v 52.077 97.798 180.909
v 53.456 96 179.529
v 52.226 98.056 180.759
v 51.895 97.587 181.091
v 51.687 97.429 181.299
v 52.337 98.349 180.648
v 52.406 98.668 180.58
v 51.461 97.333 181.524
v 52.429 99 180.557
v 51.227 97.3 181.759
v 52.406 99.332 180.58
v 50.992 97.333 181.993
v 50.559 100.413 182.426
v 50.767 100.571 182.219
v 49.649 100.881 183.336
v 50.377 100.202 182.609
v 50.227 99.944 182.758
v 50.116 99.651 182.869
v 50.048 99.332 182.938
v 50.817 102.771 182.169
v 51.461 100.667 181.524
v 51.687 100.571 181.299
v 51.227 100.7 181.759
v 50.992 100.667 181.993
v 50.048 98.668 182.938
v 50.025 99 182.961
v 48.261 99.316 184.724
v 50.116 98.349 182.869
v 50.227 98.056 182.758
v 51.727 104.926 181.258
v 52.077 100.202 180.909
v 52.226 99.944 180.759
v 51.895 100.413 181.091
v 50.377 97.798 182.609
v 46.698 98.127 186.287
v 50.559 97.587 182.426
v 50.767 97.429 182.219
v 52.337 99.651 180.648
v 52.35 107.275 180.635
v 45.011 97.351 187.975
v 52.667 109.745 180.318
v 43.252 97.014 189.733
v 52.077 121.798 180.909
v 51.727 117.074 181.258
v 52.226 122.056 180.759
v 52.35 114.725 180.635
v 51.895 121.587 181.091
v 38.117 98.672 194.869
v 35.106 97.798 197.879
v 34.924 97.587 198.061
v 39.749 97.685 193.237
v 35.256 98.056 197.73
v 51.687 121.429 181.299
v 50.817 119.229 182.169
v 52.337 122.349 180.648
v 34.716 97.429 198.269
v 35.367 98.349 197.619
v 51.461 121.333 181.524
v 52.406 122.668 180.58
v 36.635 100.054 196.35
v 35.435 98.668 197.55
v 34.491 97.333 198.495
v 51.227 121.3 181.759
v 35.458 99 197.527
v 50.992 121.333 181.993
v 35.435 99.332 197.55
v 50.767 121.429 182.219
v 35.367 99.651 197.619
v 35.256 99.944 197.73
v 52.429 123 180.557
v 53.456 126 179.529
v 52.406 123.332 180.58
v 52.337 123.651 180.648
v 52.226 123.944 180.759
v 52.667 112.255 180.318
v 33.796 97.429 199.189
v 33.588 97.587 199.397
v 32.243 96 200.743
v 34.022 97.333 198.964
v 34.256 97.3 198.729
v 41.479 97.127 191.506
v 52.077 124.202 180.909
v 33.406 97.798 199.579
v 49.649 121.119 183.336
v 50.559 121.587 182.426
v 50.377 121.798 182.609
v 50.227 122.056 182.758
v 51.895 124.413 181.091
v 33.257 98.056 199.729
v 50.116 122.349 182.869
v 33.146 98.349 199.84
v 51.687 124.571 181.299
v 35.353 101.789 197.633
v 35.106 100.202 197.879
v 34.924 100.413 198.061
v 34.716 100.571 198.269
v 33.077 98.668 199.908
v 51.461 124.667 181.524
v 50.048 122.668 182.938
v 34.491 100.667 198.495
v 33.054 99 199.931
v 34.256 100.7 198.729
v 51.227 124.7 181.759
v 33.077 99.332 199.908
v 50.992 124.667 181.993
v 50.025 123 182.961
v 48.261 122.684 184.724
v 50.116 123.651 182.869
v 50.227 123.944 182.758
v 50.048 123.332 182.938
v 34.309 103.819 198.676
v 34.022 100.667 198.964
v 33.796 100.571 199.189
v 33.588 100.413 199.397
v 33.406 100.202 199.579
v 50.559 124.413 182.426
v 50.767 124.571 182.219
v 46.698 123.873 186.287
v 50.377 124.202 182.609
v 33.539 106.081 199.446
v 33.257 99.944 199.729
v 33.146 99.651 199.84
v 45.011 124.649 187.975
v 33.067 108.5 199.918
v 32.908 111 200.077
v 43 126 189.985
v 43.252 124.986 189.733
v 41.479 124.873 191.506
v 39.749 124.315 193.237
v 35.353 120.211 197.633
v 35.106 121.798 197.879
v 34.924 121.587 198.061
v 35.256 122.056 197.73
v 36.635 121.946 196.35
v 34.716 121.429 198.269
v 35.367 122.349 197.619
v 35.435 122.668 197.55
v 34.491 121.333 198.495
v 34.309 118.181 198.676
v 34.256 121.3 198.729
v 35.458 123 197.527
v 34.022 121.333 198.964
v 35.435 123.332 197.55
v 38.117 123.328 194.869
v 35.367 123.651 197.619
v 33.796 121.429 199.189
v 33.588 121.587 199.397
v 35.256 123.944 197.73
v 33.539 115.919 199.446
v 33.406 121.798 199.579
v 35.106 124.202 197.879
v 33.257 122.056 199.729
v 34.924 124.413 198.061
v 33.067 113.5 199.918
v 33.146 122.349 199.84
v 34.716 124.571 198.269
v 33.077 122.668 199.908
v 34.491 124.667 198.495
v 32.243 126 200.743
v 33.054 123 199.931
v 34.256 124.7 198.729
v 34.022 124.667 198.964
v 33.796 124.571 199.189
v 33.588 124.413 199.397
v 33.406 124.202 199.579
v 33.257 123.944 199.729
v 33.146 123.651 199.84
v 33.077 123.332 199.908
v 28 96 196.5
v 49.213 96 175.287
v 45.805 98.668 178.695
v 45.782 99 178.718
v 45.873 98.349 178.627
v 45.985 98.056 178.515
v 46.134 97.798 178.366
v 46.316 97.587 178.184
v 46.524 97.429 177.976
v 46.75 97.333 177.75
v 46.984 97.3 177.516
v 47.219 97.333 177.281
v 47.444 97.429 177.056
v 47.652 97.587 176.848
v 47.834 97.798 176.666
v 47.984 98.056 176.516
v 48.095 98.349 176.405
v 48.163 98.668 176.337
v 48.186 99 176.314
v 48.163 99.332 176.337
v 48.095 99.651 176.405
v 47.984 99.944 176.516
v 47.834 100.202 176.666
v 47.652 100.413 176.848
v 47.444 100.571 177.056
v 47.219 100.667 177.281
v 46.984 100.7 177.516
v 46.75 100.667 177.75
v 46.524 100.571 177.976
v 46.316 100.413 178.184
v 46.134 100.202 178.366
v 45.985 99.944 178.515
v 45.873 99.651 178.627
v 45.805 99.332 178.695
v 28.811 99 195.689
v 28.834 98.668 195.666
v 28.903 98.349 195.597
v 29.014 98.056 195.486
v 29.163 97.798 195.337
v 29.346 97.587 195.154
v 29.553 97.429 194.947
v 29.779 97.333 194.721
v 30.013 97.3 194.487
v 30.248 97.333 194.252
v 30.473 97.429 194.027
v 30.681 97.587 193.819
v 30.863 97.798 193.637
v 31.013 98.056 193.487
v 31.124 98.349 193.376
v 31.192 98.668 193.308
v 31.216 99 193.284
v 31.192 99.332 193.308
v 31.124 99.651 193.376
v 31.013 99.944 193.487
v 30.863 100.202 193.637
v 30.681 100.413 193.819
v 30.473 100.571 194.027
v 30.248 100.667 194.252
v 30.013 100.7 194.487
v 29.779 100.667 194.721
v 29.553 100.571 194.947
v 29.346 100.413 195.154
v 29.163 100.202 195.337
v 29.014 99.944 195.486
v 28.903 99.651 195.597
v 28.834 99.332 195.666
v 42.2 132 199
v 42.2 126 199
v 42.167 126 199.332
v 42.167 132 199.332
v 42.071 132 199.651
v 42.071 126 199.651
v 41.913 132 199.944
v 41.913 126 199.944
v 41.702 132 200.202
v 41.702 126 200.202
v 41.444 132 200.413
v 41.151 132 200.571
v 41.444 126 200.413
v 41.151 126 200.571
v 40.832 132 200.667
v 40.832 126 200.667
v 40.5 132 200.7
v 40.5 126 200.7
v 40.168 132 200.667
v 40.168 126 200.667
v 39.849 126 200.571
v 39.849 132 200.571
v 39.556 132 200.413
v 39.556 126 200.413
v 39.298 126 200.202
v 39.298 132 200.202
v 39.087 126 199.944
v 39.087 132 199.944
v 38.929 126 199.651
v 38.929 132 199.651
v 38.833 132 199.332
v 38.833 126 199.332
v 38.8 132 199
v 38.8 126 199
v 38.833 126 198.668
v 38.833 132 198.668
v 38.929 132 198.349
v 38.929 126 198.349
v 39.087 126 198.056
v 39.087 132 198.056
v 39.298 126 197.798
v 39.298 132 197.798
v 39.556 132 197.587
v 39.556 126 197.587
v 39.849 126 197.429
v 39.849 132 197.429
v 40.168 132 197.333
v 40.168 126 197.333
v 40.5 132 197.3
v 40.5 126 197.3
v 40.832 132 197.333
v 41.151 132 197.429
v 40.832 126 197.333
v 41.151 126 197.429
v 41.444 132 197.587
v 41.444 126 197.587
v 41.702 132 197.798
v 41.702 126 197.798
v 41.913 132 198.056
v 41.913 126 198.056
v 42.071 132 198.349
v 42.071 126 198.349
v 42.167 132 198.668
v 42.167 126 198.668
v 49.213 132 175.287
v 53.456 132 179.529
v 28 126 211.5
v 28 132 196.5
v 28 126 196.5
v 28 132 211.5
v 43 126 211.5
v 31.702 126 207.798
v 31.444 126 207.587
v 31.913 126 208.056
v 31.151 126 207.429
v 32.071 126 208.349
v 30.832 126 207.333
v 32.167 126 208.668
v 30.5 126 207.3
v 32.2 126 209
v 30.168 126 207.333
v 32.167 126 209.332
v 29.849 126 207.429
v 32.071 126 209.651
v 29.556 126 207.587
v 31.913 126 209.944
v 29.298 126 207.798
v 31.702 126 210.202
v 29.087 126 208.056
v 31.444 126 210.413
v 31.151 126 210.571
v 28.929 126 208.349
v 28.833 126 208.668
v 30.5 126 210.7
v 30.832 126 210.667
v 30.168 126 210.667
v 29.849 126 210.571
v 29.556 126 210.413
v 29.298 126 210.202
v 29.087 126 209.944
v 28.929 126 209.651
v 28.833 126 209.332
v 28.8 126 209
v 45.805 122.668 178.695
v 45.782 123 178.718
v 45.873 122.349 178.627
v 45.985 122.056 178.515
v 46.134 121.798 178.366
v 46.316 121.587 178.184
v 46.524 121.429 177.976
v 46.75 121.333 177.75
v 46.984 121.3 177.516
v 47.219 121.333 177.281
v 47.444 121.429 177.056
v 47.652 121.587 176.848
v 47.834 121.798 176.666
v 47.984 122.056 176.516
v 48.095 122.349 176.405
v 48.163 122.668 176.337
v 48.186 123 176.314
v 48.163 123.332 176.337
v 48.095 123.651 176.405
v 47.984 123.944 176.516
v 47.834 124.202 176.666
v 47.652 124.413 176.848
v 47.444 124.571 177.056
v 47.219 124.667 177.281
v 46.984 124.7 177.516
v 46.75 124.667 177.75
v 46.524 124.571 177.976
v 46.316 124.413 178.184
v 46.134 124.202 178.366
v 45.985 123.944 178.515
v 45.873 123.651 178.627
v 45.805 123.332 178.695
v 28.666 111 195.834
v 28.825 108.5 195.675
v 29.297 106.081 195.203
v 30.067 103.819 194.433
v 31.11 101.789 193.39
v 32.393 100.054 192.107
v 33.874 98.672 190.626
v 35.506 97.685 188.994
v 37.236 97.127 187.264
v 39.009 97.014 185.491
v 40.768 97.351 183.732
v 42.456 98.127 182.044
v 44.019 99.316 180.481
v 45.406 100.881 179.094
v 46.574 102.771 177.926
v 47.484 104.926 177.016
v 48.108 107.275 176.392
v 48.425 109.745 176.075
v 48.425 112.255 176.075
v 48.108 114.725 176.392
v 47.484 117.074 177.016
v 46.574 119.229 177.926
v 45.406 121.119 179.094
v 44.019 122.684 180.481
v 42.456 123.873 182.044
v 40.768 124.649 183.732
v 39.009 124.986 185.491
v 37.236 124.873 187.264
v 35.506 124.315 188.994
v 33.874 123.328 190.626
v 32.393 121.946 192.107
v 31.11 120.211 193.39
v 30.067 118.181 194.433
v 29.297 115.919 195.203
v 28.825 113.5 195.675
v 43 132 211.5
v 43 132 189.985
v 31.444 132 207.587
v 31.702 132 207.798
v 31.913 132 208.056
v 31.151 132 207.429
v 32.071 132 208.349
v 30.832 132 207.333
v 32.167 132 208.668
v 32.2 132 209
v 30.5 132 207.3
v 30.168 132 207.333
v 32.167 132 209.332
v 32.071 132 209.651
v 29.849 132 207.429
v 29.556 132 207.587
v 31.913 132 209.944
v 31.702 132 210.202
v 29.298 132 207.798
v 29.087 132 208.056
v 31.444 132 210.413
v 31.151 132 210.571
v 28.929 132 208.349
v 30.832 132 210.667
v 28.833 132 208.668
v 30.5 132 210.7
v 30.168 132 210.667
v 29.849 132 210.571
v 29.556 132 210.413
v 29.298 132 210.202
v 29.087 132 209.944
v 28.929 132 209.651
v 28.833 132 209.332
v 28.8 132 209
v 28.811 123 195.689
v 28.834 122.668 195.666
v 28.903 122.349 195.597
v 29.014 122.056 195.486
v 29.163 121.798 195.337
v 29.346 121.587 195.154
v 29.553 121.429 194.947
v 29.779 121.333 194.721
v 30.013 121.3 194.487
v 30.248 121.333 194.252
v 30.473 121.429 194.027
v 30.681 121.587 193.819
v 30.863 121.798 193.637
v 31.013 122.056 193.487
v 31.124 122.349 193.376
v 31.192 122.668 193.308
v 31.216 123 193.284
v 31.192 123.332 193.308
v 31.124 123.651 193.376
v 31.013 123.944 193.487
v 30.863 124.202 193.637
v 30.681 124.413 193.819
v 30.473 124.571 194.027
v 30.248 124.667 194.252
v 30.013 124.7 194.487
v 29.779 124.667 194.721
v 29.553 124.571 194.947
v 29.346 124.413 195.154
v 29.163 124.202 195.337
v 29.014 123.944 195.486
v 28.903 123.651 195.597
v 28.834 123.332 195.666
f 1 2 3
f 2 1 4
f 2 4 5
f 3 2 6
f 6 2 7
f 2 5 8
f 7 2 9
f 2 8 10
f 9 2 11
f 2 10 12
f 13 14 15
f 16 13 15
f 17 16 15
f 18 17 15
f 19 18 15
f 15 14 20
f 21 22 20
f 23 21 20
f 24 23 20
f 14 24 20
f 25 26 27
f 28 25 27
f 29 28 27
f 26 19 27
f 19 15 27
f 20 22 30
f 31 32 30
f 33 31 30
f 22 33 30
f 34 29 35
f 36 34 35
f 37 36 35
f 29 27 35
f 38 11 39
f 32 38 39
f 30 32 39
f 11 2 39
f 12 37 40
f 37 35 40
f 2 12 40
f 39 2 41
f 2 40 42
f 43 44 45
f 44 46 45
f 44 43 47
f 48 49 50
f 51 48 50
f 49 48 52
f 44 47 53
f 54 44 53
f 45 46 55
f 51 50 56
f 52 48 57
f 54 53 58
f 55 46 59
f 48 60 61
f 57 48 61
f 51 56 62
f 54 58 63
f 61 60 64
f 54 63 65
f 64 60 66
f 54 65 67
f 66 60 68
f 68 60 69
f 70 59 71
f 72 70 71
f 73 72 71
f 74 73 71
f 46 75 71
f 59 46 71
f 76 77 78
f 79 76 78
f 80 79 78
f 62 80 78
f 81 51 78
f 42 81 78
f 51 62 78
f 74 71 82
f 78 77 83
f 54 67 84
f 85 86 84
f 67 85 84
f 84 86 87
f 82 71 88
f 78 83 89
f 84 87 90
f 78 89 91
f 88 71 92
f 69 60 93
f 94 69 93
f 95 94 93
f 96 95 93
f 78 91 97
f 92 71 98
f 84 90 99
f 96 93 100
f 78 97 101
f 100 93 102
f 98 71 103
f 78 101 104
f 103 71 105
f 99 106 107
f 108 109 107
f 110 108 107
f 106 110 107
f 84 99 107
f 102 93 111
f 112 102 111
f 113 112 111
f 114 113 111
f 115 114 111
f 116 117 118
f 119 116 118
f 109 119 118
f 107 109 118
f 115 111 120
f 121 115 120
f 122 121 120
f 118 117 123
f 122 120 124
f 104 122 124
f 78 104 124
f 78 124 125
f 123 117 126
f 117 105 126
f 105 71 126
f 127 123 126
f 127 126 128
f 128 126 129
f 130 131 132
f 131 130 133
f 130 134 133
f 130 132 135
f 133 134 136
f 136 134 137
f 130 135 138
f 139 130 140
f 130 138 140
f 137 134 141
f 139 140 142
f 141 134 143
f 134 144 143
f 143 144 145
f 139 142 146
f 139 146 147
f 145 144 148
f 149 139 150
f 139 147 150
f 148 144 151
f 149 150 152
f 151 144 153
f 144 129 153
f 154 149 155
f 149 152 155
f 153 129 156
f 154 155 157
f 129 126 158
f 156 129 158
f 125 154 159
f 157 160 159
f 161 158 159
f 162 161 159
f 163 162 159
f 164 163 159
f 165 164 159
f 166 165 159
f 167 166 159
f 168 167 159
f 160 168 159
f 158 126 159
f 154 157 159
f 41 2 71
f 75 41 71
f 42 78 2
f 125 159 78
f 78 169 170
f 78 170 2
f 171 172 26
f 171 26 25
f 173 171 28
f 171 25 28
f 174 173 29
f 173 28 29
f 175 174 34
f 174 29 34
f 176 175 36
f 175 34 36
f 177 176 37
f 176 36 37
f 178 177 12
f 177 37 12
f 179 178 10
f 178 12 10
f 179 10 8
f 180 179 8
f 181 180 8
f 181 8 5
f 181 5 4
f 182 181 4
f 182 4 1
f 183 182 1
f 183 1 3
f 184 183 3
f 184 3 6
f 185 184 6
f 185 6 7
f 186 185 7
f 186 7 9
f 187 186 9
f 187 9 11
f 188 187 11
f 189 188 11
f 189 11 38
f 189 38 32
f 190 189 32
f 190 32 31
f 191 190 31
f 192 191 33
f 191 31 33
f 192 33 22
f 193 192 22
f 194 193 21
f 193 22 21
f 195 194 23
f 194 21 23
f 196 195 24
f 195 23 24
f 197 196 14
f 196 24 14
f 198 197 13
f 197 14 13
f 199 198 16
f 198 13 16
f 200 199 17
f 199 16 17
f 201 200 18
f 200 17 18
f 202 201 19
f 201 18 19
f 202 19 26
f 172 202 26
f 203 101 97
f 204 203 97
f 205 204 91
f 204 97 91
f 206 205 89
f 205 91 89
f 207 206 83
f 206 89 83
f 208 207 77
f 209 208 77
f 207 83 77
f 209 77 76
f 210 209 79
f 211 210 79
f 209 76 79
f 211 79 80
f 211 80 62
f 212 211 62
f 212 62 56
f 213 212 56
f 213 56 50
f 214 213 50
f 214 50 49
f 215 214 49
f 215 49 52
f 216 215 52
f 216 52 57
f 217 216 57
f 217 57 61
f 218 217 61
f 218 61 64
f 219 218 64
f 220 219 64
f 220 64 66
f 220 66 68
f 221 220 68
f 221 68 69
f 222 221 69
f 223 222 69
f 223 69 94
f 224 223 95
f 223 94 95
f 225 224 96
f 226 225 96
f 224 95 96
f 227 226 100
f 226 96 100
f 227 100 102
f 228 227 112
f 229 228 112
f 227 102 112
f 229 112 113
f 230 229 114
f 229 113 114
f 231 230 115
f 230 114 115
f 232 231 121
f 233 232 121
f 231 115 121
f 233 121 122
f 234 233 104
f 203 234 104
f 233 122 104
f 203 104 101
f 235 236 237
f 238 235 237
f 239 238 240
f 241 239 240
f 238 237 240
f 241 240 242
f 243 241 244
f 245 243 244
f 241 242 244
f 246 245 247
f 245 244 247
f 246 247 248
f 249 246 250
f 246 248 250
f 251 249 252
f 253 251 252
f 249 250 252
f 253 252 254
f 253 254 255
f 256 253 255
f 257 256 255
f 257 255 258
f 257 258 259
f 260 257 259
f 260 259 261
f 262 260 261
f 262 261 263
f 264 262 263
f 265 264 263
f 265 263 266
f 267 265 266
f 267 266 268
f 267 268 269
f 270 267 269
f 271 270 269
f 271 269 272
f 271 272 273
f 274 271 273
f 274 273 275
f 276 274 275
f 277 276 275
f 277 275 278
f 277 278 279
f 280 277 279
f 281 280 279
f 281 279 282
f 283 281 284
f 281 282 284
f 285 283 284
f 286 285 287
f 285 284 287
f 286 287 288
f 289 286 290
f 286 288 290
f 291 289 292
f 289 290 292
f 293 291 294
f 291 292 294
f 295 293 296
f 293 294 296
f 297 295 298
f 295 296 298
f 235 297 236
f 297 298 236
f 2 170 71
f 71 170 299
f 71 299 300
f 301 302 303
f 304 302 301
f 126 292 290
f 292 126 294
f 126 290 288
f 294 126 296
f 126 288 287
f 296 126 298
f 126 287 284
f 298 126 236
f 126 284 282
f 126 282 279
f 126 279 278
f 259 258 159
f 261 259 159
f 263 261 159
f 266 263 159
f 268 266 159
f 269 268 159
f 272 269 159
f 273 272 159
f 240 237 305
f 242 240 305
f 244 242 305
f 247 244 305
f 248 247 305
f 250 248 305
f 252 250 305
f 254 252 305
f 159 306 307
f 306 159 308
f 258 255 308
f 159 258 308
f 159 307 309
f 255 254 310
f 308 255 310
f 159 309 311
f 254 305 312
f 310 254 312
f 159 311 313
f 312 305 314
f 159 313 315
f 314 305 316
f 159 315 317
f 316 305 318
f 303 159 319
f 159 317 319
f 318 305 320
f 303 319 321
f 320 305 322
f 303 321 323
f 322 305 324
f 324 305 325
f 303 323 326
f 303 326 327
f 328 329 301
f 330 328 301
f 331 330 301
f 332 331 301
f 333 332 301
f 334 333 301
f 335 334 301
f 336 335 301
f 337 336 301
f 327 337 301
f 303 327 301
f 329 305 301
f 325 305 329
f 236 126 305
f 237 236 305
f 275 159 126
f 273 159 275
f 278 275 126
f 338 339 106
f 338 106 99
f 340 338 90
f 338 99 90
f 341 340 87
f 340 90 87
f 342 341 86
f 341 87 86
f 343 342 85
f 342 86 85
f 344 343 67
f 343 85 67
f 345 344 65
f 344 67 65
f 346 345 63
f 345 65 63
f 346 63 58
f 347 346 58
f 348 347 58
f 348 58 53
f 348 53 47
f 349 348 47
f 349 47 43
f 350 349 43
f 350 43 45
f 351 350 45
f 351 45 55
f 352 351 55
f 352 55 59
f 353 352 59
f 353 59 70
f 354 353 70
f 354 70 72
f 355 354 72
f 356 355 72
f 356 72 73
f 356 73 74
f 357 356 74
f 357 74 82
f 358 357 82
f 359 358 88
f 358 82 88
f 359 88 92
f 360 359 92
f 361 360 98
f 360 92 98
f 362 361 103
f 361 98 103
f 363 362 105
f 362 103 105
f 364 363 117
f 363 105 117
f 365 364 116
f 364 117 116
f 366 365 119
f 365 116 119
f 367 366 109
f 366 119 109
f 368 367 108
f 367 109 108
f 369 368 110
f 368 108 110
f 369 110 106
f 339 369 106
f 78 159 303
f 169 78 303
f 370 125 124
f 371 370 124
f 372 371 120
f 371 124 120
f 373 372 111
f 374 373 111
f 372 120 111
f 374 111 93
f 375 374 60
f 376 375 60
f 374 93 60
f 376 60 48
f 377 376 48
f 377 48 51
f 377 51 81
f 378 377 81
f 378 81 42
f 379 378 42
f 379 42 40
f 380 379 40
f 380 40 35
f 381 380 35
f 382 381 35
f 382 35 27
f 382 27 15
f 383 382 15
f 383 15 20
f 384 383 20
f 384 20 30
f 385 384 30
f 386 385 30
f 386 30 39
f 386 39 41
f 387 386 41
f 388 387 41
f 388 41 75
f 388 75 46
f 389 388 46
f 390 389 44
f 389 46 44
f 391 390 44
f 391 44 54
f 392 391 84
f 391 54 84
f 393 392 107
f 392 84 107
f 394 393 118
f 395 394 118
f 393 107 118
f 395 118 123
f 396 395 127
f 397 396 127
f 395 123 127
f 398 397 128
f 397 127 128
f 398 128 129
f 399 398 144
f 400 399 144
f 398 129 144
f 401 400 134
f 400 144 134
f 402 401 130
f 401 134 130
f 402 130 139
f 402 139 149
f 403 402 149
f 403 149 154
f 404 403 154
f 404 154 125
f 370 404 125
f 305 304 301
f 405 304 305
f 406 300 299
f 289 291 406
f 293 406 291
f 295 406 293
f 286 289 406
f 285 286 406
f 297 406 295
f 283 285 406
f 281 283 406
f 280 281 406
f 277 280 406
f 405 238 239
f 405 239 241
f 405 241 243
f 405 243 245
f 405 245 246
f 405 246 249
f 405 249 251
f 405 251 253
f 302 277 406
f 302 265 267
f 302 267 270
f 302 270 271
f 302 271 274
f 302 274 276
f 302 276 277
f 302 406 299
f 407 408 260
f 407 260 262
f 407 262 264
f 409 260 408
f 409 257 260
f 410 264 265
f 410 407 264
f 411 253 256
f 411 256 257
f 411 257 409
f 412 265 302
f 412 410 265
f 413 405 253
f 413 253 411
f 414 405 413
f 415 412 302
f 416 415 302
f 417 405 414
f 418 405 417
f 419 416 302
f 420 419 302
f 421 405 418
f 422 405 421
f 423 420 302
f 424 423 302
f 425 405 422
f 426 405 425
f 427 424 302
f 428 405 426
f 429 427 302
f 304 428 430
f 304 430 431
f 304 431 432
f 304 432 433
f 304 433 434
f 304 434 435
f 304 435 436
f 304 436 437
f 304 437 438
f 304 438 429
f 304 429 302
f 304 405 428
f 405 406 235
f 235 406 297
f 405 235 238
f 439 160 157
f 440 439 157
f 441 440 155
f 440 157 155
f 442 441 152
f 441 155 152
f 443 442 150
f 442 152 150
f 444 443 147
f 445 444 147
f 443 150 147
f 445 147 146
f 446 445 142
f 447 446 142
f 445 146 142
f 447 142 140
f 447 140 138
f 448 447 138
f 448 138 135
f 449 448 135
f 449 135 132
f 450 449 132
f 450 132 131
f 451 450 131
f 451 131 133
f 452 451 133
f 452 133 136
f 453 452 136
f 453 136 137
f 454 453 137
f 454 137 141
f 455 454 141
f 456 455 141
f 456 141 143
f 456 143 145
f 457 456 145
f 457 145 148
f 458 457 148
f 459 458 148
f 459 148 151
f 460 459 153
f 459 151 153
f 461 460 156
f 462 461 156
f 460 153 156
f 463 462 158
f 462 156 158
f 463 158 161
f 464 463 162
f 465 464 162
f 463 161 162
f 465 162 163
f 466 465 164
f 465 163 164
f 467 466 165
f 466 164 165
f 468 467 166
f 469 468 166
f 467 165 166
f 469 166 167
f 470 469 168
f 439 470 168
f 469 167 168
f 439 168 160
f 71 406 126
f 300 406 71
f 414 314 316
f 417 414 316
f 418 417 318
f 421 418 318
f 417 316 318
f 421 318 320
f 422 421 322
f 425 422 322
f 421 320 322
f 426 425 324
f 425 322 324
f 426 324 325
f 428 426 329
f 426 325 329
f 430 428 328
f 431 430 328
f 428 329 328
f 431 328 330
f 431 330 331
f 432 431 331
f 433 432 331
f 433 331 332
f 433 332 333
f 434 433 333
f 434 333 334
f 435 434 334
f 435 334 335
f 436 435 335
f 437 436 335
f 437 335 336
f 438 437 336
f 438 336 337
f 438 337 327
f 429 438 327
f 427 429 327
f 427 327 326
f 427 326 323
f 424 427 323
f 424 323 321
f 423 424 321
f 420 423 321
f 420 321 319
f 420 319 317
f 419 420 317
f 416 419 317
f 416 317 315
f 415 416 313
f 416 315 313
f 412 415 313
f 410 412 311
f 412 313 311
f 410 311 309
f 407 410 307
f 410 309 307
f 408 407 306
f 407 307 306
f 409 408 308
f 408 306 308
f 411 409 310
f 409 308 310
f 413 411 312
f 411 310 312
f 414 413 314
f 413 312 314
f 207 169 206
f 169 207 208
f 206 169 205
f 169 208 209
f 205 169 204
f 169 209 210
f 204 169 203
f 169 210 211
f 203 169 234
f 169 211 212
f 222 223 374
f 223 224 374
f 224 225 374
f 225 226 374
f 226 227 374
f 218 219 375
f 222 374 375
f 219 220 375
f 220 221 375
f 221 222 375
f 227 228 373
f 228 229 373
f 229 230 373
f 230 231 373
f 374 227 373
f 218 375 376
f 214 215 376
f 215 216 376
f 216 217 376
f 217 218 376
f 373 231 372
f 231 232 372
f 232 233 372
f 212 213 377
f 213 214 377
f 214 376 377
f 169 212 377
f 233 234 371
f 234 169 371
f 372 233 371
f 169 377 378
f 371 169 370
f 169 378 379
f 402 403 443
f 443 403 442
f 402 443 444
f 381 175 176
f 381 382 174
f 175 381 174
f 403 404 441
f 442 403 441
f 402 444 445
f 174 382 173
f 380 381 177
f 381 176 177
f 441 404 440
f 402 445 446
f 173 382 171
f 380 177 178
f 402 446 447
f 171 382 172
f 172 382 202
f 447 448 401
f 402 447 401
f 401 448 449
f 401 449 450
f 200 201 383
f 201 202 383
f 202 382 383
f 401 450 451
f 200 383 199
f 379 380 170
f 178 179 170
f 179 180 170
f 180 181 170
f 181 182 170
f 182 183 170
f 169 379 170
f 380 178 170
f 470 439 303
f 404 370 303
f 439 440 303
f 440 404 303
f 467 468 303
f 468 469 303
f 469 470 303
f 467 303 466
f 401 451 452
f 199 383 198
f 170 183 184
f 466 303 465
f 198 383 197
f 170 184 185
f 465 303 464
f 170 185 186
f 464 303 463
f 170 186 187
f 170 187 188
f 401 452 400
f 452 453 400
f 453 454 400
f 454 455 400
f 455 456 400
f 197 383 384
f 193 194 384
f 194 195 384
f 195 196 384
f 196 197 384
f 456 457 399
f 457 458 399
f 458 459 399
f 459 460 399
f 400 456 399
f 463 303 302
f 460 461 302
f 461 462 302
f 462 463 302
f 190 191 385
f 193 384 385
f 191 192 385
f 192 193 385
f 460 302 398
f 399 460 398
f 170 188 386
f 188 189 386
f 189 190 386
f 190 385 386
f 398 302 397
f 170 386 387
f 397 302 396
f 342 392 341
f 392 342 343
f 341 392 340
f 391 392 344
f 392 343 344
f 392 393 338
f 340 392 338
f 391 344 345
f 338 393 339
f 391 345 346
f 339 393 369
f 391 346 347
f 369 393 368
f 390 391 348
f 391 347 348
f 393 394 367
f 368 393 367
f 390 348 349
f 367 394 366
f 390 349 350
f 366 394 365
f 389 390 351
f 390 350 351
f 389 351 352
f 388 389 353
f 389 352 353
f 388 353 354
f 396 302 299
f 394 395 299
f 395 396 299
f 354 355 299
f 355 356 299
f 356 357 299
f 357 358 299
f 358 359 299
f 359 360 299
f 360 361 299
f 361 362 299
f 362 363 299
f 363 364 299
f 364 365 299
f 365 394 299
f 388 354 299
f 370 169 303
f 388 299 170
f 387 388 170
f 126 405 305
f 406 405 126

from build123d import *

# Parameters (mm, degrees)
PAD040_DEPTH    = 6
PAD041_DEPTH    = 30
SKETCH118_R     = 14
POCKET038_DEPTH = 21.001
SKETCH119_R     = 1.7
HOLE023_DEPTH   = 25
SKETCH120_R     = 1.7
HOLE024_DEPTH   = 25


with BuildPart() as part:
    # Sketch116 → Pad040 (new body)
    with BuildSketch(Plane.XZ):
        Polygon((28, 211.5), (43, 211.5), (43, 189.985281), (53.455844, 179.529437), (49.213203, 175.286797), (28, 196.5), align=None)
    extrude(amount=PAD040_DEPTH)

    # Sketch117 (on Face8 of Pad040) → Pad041 (join)
    with BuildSketch(Plane.XZ.offset(6)):
        Polygon((28, 196.5), (49.213203, 175.286797), (53.455844, 179.529437), (32.242641, 200.742641), align=None)
    extrude(amount=PAD041_DEPTH)

    # Sketch118 (on Face10 of Pad041) → Pocket038 (cut, through all)
    with BuildSketch(Plane(origin=(116.492641, 0, 116.492641), x_dir=(-0.707107, 0, 0.707107), z_dir=(0.707107, 0, 0.707107))):
        with Locations((104.206258, 21)):
            Circle(SKETCH118_R)
    extrude(amount=-POCKET038_DEPTH, mode=Mode.SUBTRACT)

    # Sketch119 (on Face10 of Pocket038) → Hole023 (cut)
    with BuildSketch(Plane(origin=(116.492641, 0, 116.492641), x_dir=(-0.707107, 0, 0.707107), z_dir=(0.707107, 0, 0.707107))):
        with Locations((92.3, 33)):
            Circle(SKETCH119_R)
        with Locations((116.3, 33)):
            Circle(SKETCH119_R)
        with Locations((92.3, 9)):
            Circle(SKETCH119_R)
        with Locations((116.3, 9)):
            Circle(SKETCH119_R)
    extrude(amount=-HOLE023_DEPTH, mode=Mode.SUBTRACT)

    # Sketch120 (on Face5 of Hole023) → Hole024 (cut)
    with BuildSketch(Plane.XZ.offset(6)):
        with Locations((30.5, 209)):
            Circle(SKETCH120_R)
        with Locations((40.5, 199)):
            Circle(SKETCH120_R)
    extrude(amount=-HOLE024_DEPTH, mode=Mode.SUBTRACT)


with BuildPart() as part_1:
    # Body017 placement: moved
    add(part.part.moved(Location((0, 132, 0))))


solid = part_1.part
